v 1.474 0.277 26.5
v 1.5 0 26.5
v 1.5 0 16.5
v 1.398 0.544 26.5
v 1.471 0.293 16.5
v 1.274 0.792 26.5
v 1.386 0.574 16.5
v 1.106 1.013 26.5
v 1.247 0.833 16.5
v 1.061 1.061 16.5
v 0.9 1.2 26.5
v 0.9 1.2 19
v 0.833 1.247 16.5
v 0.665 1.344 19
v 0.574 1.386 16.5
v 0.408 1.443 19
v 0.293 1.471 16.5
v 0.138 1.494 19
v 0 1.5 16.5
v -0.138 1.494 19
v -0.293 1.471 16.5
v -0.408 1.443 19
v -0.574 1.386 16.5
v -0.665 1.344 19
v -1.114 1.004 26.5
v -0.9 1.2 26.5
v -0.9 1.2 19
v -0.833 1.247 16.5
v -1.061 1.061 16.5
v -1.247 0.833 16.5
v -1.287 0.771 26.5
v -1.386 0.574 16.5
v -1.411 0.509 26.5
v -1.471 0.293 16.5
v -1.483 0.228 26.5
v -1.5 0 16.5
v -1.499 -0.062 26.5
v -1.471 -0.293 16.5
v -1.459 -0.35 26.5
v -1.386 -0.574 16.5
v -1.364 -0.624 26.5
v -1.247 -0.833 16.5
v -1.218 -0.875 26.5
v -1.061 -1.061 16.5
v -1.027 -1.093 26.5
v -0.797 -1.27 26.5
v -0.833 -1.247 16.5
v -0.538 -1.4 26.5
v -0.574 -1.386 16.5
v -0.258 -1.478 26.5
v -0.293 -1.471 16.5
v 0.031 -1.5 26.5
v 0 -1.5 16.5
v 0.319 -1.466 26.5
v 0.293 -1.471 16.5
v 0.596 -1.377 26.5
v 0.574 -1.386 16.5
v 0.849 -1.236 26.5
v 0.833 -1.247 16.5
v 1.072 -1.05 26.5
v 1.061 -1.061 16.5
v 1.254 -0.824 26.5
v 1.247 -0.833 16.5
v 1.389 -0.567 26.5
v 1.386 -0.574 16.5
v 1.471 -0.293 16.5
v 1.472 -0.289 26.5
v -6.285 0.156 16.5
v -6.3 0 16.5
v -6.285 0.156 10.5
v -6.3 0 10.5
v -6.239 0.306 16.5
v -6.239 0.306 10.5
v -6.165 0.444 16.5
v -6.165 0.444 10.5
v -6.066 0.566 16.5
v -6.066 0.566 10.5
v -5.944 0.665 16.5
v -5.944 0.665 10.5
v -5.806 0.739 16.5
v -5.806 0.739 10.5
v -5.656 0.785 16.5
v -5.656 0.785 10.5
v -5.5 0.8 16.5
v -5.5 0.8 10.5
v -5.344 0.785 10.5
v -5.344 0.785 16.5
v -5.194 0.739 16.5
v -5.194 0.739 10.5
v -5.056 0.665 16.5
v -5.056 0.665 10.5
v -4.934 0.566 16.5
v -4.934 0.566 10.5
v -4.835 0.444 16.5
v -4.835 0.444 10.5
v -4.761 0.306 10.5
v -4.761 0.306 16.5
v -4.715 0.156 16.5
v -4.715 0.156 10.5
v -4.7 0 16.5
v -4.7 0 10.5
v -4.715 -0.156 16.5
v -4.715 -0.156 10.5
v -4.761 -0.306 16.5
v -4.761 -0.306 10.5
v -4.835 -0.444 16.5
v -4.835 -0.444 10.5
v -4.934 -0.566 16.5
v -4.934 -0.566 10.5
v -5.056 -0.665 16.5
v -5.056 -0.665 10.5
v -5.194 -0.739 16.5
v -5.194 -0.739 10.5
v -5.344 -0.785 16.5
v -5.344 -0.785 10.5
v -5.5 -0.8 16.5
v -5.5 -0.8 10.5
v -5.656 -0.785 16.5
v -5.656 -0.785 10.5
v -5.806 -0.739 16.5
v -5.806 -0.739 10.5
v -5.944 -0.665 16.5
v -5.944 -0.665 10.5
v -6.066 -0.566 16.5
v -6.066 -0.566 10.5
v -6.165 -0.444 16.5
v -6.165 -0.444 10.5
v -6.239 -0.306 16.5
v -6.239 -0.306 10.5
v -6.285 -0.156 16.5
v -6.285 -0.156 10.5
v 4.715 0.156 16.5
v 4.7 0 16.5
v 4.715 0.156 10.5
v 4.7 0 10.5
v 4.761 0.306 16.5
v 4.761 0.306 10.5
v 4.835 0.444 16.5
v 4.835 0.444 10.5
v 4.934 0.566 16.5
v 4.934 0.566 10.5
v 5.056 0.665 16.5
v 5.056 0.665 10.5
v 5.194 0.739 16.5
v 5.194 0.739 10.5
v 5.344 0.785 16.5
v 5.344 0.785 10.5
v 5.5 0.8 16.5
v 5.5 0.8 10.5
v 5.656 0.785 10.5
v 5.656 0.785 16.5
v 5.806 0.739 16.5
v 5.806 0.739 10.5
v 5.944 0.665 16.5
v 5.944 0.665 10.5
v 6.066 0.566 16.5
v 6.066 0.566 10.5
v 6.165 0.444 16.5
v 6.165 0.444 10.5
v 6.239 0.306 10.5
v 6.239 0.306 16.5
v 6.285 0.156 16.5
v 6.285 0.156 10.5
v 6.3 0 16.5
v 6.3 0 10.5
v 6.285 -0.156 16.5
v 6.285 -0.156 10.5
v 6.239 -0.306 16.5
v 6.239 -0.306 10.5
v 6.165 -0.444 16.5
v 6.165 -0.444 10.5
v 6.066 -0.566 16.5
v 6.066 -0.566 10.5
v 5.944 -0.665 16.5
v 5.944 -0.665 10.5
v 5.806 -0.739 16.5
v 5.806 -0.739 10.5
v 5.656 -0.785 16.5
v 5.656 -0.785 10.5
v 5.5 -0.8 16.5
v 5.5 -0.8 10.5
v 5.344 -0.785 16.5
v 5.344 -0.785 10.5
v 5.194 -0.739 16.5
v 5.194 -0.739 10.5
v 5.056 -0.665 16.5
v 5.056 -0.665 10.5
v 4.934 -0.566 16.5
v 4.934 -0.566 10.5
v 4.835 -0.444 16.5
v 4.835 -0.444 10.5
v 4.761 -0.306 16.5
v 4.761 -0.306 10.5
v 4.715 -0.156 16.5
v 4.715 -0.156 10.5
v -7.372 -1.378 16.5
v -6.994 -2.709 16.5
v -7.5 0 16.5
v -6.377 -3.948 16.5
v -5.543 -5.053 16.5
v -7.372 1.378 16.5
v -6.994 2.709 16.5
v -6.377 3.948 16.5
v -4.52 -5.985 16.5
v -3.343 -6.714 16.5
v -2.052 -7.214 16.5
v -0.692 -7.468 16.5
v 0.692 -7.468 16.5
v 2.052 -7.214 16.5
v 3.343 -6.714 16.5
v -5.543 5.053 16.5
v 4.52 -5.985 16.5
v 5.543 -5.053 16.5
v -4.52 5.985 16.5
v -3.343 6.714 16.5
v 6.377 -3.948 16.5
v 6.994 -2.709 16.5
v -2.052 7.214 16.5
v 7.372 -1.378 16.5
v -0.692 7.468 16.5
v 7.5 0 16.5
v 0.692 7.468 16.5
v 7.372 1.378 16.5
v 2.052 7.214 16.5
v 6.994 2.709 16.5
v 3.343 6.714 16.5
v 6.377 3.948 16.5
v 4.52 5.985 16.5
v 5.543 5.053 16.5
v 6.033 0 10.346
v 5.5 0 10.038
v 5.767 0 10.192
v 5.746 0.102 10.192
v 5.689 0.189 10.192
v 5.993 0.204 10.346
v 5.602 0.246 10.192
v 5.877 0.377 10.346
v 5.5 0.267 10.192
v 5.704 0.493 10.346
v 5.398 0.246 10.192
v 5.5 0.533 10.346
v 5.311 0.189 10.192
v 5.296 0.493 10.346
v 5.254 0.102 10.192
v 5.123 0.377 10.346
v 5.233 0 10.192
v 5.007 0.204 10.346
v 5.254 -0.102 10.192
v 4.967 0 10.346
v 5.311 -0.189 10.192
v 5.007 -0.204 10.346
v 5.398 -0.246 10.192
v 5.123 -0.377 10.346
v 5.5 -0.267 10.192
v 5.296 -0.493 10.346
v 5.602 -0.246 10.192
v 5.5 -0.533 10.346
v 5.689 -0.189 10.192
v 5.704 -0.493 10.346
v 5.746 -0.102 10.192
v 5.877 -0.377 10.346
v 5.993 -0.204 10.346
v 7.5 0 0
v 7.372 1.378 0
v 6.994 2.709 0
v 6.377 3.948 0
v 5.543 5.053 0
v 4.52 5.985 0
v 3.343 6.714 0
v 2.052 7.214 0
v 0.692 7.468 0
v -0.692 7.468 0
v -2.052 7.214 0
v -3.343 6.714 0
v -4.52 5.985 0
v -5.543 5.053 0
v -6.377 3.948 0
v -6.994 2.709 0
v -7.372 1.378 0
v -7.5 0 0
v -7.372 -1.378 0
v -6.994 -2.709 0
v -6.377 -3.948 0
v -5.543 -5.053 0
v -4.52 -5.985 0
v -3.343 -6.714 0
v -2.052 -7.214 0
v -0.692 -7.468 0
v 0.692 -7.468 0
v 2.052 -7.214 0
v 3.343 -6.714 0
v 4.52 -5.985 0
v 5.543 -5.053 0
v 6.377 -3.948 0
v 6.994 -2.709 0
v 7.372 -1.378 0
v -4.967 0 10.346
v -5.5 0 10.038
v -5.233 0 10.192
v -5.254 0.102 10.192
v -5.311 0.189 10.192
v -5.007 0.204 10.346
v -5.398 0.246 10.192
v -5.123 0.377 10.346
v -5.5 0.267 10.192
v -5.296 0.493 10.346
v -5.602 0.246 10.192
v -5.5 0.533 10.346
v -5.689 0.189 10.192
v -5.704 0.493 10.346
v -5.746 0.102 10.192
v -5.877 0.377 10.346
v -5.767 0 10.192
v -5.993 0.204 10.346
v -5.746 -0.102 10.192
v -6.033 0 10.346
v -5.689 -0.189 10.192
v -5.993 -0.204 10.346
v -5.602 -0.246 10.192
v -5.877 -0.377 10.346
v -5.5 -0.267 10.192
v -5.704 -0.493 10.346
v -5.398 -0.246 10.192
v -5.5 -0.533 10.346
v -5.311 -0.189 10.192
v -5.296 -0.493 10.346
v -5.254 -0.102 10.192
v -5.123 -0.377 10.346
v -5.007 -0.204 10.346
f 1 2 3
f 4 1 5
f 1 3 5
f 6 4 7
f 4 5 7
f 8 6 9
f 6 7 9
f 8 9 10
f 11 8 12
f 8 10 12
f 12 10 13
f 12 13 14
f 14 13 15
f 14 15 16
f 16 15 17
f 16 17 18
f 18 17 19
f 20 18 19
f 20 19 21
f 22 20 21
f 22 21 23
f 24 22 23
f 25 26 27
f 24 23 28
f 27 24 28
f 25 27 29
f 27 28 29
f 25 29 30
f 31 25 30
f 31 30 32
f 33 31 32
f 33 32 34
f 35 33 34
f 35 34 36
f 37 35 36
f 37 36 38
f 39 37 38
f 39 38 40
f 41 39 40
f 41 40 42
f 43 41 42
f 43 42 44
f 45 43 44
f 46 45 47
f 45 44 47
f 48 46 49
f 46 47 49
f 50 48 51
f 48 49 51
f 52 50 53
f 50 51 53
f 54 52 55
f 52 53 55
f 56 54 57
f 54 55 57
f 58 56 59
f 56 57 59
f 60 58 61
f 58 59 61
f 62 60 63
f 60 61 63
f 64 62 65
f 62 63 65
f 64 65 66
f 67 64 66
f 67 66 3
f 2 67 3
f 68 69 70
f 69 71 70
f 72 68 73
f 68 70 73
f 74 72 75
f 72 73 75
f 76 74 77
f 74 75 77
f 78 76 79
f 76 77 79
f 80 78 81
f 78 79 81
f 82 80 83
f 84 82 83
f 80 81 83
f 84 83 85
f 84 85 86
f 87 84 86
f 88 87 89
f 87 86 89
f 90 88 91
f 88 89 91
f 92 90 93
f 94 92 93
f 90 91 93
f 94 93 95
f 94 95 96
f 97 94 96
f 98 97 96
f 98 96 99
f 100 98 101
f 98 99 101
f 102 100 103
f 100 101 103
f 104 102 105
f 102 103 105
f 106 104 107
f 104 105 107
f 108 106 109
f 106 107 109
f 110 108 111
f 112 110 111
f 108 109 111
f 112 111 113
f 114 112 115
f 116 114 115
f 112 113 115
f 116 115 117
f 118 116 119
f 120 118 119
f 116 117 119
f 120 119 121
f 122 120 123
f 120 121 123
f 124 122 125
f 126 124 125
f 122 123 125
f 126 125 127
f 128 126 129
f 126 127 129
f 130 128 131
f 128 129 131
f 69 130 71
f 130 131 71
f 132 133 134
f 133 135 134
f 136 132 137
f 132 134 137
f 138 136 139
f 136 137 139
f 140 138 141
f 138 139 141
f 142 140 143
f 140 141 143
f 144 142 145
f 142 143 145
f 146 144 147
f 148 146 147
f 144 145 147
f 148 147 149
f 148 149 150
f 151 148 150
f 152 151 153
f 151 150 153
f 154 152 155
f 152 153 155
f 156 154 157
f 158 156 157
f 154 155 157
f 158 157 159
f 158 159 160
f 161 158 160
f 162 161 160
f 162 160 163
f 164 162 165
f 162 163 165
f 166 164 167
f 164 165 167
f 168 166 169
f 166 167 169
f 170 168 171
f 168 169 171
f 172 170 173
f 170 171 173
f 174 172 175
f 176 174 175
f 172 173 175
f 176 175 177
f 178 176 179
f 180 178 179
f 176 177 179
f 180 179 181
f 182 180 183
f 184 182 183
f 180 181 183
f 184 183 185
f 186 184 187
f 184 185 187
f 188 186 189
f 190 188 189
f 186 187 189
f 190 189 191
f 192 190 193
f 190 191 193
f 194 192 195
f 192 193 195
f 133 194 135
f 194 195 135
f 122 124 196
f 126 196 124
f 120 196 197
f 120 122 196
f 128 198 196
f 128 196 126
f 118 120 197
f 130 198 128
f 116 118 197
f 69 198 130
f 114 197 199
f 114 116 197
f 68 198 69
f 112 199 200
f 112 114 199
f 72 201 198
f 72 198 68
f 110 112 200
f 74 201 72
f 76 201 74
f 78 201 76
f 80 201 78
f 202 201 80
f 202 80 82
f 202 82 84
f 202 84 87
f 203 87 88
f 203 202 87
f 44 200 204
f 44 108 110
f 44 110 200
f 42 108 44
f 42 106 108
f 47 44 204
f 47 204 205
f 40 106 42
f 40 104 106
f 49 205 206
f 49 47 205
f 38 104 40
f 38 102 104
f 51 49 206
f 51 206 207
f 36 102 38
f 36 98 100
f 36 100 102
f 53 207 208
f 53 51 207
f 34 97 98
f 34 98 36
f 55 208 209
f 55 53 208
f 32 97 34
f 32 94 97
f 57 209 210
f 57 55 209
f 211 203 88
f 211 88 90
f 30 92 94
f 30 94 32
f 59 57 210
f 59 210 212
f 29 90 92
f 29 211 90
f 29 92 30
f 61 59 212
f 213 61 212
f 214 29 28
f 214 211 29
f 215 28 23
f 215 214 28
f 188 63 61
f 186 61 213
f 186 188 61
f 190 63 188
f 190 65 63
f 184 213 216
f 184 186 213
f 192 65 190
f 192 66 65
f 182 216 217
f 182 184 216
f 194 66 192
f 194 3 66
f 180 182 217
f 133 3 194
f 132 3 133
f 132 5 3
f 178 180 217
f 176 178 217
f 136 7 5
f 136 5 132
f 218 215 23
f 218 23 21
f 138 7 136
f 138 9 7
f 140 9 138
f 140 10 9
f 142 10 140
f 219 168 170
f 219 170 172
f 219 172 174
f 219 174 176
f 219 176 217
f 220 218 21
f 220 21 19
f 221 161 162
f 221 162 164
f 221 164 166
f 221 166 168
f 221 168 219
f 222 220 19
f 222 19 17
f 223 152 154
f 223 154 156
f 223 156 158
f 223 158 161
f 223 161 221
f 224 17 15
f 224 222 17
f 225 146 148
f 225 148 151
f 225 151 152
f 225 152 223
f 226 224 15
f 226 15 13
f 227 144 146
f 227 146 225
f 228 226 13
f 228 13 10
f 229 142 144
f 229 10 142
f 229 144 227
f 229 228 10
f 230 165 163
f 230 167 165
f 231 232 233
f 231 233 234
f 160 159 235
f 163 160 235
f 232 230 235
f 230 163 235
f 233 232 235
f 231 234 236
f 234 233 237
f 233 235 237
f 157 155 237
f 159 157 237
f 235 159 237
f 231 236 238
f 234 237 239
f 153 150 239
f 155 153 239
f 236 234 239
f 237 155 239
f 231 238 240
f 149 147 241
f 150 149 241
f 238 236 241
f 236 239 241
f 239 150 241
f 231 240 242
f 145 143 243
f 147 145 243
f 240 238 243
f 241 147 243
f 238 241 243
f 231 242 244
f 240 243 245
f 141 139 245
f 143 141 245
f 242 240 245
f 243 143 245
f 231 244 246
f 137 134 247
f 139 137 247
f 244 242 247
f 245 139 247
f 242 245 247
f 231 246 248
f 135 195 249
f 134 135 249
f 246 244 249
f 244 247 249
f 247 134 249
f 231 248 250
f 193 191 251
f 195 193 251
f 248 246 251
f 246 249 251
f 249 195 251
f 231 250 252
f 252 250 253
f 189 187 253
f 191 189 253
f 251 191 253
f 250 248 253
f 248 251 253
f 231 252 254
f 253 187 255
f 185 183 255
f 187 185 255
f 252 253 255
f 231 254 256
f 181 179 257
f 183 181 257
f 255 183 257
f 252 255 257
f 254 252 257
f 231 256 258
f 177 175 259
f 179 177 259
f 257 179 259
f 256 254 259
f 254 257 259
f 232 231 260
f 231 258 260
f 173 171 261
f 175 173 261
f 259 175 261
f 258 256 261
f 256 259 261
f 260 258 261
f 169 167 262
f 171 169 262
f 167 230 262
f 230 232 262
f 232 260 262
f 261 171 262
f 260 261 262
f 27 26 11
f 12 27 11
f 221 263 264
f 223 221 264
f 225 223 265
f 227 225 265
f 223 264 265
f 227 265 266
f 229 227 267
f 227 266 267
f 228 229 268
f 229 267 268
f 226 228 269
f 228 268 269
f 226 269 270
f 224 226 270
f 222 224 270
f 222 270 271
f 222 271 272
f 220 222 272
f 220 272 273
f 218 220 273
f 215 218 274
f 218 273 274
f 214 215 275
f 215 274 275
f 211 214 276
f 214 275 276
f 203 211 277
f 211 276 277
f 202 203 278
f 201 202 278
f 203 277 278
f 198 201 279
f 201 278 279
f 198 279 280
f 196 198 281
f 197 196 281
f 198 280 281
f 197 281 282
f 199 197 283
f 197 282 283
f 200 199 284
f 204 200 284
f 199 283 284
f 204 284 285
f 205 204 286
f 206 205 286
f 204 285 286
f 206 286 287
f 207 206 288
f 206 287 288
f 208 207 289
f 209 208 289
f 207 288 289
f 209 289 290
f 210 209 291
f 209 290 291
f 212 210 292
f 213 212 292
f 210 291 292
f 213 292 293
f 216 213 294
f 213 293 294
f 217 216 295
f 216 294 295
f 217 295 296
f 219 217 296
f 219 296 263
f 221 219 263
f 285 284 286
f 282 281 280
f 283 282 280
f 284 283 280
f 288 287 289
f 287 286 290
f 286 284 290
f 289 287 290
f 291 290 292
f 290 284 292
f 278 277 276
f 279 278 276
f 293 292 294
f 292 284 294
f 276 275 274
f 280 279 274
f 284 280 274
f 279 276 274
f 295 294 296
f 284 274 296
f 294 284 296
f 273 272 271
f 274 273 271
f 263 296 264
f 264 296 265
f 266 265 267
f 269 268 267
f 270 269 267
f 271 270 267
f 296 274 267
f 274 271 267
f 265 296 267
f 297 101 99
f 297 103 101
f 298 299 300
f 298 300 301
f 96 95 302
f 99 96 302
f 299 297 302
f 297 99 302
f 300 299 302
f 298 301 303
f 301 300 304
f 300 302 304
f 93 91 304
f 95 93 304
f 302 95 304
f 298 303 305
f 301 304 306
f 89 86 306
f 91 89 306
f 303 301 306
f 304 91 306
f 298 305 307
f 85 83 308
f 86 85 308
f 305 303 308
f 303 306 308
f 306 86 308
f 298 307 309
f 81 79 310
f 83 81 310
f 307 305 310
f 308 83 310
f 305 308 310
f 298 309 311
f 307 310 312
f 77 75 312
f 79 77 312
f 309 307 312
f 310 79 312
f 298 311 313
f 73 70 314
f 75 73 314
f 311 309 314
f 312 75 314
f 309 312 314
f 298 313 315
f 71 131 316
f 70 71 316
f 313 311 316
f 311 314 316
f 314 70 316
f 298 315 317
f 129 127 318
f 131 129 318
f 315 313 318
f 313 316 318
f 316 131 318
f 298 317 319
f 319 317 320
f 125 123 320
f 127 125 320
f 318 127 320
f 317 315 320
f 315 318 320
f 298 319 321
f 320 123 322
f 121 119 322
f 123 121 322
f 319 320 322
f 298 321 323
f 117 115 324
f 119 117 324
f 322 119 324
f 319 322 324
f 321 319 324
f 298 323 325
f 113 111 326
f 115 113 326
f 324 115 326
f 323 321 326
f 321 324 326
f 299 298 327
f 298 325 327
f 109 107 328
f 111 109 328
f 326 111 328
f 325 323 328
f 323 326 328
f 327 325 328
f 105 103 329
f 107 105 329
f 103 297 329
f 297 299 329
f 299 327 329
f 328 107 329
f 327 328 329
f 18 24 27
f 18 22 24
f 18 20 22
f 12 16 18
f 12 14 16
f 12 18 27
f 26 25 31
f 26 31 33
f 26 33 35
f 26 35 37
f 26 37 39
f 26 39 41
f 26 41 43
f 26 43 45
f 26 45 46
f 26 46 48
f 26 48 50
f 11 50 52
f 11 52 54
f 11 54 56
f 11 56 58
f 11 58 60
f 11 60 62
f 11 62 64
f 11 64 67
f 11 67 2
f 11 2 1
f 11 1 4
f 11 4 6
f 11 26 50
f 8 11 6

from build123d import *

# Parameters (mm, degrees)
SKETCH_1_R             = 7.5
EXTRUDE_1_DEPTH        = 16.5
SKETCH_2_R             = 1.5
EXTRUDE_2_DEPTH        = 10
SKETCH_3_W             = 3.798806197
SKETCH_3_H             = 0.511244187
CUT_EXTRUDE_1_DEPTH    = 7.5
HOLE_WIZARD_M2_1_D     = 1.6
HOLE_WIZARD_M2_1_DEPTH = 6
HOLE_WIZARD_M2_1_TIP   = 0.461880215


with BuildPart() as part:
    # 草图1 → 凸台-拉伸1 (new body)
    with BuildSketch(Plane.XY):
        Circle(SKETCH_1_R)
    extrude(amount=EXTRUDE_1_DEPTH)

    # 草图2 → 凸台-拉伸2 (add)
    with BuildSketch(Plane.XY.offset(16.5)):
        Circle(SKETCH_2_R)
    extrude(amount=EXTRUDE_2_DEPTH)

    # 草图3 → 切除-拉伸1 (cut)
    with BuildSketch(Plane.XY.offset(26.5)):
        with Locations((0.268189439, 1.455622094)):
            Rectangle(SKETCH_3_W, SKETCH_3_H)
    extrude(amount=-CUT_EXTRUDE_1_DEPTH, mode=Mode.SUBTRACT)

    # M2 螺纹孔1
    with Locations(Plane(origin=(5.5, 0, 16.5), x_dir=(1, 0, 0), z_dir=(0, 0, 1))):
        with Locations((0, 0), (-11, 0)):
            Hole(HOLE_WIZARD_M2_1_D / 2, depth=HOLE_WIZARD_M2_1_DEPTH)
            with Locations((0, 0, -(HOLE_WIZARD_M2_1_DEPTH + HOLE_WIZARD_M2_1_TIP / 2))):  # 120° drill point
                Cone(0, HOLE_WIZARD_M2_1_D / 2, HOLE_WIZARD_M2_1_TIP, mode=Mode.SUBTRACT)


solid = part.part
